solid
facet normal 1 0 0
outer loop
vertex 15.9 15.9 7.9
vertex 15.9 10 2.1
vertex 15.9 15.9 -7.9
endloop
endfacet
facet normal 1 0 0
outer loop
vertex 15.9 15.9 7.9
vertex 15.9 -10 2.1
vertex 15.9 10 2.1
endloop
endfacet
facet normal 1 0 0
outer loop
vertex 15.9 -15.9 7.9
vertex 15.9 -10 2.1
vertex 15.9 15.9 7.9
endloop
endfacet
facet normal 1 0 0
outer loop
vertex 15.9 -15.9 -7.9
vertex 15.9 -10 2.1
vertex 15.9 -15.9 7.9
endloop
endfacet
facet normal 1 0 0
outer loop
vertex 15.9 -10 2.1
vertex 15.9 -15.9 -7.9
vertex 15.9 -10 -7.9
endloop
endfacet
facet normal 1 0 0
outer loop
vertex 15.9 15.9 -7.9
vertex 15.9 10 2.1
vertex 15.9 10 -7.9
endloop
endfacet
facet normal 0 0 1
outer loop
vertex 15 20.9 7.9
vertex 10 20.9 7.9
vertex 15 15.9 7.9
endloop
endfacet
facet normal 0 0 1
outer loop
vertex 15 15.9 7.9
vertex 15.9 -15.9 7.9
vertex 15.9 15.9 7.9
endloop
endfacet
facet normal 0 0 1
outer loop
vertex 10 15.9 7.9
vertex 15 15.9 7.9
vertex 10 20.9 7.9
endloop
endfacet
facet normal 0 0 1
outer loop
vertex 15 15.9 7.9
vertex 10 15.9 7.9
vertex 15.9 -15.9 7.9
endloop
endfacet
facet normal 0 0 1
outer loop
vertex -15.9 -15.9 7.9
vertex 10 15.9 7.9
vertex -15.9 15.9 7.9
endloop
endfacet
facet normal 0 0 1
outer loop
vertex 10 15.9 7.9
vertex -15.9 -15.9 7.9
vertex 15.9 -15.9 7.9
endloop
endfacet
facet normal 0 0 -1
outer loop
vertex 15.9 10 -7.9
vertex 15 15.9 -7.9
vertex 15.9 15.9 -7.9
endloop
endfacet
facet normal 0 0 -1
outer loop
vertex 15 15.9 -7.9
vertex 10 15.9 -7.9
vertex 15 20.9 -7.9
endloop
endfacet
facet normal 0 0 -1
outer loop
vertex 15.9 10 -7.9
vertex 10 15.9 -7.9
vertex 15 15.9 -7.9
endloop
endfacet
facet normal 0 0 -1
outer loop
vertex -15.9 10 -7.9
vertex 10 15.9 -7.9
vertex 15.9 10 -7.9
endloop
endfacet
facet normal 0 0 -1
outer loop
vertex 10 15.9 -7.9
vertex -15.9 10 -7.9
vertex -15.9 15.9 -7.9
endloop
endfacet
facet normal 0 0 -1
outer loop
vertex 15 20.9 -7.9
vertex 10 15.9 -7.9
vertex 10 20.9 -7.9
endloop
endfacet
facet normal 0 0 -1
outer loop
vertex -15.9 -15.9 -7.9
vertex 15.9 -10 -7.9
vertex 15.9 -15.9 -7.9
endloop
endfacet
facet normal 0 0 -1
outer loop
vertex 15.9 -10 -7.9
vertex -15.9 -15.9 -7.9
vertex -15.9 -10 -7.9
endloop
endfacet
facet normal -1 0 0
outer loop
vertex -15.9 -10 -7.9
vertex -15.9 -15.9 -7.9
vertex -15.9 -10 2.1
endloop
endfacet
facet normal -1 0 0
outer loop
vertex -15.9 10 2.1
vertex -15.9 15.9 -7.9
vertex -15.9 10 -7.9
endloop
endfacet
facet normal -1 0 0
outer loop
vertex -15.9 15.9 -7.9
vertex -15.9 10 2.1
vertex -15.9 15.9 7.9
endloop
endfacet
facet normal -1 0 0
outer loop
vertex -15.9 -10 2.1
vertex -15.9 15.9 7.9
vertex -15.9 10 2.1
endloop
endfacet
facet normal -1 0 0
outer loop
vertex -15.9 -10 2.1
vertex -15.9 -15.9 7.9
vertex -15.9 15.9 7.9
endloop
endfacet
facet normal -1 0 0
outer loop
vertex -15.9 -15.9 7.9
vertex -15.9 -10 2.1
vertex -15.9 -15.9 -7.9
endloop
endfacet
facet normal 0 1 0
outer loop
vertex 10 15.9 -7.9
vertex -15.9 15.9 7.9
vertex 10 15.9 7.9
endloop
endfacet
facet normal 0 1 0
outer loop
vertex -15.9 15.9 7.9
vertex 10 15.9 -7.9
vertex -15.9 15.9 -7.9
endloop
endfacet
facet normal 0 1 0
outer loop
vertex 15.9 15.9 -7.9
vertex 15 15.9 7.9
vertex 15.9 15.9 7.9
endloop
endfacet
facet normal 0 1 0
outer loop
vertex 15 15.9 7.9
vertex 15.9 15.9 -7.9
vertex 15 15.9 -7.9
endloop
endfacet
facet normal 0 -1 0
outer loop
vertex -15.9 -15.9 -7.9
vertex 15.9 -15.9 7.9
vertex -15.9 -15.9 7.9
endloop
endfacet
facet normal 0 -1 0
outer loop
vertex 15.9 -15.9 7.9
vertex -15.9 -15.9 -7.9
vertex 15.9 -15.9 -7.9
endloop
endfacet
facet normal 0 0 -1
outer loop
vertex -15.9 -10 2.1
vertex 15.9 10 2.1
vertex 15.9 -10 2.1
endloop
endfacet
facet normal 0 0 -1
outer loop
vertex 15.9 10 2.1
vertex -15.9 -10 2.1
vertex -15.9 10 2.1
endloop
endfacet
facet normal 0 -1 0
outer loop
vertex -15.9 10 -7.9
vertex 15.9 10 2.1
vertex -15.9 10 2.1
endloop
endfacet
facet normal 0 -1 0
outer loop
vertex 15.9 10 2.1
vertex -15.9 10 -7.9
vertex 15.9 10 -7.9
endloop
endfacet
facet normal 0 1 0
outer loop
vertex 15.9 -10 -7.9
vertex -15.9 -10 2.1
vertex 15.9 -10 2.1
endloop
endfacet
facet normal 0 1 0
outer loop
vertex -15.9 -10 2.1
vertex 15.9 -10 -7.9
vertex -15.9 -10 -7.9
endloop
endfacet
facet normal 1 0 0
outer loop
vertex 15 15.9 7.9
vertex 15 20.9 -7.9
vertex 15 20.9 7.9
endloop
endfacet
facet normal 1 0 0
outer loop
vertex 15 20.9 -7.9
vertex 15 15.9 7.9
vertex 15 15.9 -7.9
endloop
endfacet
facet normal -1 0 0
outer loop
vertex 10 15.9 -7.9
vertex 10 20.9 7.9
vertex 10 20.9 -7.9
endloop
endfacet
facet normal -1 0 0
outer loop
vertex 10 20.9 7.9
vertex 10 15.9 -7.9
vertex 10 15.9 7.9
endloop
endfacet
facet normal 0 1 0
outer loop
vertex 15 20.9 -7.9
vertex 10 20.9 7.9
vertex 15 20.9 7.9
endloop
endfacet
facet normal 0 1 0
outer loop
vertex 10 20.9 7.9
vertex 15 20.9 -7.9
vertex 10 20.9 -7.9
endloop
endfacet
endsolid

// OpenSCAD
module c_shaped_bracket() {
    difference() {
        // Main block
        cube([31.8, 31.8, 15.8], center = true);
        
        // Internal cutout
        translate([-15.9, -10, -7.9])
            cube([31.8, 20, 10], center = false);
    }
    
    // Protruding lug/stop
    translate([10, 15.9, -7.9])
        cube([5, 5, 15.8], center = false);
}

c_shaped_bracket();
